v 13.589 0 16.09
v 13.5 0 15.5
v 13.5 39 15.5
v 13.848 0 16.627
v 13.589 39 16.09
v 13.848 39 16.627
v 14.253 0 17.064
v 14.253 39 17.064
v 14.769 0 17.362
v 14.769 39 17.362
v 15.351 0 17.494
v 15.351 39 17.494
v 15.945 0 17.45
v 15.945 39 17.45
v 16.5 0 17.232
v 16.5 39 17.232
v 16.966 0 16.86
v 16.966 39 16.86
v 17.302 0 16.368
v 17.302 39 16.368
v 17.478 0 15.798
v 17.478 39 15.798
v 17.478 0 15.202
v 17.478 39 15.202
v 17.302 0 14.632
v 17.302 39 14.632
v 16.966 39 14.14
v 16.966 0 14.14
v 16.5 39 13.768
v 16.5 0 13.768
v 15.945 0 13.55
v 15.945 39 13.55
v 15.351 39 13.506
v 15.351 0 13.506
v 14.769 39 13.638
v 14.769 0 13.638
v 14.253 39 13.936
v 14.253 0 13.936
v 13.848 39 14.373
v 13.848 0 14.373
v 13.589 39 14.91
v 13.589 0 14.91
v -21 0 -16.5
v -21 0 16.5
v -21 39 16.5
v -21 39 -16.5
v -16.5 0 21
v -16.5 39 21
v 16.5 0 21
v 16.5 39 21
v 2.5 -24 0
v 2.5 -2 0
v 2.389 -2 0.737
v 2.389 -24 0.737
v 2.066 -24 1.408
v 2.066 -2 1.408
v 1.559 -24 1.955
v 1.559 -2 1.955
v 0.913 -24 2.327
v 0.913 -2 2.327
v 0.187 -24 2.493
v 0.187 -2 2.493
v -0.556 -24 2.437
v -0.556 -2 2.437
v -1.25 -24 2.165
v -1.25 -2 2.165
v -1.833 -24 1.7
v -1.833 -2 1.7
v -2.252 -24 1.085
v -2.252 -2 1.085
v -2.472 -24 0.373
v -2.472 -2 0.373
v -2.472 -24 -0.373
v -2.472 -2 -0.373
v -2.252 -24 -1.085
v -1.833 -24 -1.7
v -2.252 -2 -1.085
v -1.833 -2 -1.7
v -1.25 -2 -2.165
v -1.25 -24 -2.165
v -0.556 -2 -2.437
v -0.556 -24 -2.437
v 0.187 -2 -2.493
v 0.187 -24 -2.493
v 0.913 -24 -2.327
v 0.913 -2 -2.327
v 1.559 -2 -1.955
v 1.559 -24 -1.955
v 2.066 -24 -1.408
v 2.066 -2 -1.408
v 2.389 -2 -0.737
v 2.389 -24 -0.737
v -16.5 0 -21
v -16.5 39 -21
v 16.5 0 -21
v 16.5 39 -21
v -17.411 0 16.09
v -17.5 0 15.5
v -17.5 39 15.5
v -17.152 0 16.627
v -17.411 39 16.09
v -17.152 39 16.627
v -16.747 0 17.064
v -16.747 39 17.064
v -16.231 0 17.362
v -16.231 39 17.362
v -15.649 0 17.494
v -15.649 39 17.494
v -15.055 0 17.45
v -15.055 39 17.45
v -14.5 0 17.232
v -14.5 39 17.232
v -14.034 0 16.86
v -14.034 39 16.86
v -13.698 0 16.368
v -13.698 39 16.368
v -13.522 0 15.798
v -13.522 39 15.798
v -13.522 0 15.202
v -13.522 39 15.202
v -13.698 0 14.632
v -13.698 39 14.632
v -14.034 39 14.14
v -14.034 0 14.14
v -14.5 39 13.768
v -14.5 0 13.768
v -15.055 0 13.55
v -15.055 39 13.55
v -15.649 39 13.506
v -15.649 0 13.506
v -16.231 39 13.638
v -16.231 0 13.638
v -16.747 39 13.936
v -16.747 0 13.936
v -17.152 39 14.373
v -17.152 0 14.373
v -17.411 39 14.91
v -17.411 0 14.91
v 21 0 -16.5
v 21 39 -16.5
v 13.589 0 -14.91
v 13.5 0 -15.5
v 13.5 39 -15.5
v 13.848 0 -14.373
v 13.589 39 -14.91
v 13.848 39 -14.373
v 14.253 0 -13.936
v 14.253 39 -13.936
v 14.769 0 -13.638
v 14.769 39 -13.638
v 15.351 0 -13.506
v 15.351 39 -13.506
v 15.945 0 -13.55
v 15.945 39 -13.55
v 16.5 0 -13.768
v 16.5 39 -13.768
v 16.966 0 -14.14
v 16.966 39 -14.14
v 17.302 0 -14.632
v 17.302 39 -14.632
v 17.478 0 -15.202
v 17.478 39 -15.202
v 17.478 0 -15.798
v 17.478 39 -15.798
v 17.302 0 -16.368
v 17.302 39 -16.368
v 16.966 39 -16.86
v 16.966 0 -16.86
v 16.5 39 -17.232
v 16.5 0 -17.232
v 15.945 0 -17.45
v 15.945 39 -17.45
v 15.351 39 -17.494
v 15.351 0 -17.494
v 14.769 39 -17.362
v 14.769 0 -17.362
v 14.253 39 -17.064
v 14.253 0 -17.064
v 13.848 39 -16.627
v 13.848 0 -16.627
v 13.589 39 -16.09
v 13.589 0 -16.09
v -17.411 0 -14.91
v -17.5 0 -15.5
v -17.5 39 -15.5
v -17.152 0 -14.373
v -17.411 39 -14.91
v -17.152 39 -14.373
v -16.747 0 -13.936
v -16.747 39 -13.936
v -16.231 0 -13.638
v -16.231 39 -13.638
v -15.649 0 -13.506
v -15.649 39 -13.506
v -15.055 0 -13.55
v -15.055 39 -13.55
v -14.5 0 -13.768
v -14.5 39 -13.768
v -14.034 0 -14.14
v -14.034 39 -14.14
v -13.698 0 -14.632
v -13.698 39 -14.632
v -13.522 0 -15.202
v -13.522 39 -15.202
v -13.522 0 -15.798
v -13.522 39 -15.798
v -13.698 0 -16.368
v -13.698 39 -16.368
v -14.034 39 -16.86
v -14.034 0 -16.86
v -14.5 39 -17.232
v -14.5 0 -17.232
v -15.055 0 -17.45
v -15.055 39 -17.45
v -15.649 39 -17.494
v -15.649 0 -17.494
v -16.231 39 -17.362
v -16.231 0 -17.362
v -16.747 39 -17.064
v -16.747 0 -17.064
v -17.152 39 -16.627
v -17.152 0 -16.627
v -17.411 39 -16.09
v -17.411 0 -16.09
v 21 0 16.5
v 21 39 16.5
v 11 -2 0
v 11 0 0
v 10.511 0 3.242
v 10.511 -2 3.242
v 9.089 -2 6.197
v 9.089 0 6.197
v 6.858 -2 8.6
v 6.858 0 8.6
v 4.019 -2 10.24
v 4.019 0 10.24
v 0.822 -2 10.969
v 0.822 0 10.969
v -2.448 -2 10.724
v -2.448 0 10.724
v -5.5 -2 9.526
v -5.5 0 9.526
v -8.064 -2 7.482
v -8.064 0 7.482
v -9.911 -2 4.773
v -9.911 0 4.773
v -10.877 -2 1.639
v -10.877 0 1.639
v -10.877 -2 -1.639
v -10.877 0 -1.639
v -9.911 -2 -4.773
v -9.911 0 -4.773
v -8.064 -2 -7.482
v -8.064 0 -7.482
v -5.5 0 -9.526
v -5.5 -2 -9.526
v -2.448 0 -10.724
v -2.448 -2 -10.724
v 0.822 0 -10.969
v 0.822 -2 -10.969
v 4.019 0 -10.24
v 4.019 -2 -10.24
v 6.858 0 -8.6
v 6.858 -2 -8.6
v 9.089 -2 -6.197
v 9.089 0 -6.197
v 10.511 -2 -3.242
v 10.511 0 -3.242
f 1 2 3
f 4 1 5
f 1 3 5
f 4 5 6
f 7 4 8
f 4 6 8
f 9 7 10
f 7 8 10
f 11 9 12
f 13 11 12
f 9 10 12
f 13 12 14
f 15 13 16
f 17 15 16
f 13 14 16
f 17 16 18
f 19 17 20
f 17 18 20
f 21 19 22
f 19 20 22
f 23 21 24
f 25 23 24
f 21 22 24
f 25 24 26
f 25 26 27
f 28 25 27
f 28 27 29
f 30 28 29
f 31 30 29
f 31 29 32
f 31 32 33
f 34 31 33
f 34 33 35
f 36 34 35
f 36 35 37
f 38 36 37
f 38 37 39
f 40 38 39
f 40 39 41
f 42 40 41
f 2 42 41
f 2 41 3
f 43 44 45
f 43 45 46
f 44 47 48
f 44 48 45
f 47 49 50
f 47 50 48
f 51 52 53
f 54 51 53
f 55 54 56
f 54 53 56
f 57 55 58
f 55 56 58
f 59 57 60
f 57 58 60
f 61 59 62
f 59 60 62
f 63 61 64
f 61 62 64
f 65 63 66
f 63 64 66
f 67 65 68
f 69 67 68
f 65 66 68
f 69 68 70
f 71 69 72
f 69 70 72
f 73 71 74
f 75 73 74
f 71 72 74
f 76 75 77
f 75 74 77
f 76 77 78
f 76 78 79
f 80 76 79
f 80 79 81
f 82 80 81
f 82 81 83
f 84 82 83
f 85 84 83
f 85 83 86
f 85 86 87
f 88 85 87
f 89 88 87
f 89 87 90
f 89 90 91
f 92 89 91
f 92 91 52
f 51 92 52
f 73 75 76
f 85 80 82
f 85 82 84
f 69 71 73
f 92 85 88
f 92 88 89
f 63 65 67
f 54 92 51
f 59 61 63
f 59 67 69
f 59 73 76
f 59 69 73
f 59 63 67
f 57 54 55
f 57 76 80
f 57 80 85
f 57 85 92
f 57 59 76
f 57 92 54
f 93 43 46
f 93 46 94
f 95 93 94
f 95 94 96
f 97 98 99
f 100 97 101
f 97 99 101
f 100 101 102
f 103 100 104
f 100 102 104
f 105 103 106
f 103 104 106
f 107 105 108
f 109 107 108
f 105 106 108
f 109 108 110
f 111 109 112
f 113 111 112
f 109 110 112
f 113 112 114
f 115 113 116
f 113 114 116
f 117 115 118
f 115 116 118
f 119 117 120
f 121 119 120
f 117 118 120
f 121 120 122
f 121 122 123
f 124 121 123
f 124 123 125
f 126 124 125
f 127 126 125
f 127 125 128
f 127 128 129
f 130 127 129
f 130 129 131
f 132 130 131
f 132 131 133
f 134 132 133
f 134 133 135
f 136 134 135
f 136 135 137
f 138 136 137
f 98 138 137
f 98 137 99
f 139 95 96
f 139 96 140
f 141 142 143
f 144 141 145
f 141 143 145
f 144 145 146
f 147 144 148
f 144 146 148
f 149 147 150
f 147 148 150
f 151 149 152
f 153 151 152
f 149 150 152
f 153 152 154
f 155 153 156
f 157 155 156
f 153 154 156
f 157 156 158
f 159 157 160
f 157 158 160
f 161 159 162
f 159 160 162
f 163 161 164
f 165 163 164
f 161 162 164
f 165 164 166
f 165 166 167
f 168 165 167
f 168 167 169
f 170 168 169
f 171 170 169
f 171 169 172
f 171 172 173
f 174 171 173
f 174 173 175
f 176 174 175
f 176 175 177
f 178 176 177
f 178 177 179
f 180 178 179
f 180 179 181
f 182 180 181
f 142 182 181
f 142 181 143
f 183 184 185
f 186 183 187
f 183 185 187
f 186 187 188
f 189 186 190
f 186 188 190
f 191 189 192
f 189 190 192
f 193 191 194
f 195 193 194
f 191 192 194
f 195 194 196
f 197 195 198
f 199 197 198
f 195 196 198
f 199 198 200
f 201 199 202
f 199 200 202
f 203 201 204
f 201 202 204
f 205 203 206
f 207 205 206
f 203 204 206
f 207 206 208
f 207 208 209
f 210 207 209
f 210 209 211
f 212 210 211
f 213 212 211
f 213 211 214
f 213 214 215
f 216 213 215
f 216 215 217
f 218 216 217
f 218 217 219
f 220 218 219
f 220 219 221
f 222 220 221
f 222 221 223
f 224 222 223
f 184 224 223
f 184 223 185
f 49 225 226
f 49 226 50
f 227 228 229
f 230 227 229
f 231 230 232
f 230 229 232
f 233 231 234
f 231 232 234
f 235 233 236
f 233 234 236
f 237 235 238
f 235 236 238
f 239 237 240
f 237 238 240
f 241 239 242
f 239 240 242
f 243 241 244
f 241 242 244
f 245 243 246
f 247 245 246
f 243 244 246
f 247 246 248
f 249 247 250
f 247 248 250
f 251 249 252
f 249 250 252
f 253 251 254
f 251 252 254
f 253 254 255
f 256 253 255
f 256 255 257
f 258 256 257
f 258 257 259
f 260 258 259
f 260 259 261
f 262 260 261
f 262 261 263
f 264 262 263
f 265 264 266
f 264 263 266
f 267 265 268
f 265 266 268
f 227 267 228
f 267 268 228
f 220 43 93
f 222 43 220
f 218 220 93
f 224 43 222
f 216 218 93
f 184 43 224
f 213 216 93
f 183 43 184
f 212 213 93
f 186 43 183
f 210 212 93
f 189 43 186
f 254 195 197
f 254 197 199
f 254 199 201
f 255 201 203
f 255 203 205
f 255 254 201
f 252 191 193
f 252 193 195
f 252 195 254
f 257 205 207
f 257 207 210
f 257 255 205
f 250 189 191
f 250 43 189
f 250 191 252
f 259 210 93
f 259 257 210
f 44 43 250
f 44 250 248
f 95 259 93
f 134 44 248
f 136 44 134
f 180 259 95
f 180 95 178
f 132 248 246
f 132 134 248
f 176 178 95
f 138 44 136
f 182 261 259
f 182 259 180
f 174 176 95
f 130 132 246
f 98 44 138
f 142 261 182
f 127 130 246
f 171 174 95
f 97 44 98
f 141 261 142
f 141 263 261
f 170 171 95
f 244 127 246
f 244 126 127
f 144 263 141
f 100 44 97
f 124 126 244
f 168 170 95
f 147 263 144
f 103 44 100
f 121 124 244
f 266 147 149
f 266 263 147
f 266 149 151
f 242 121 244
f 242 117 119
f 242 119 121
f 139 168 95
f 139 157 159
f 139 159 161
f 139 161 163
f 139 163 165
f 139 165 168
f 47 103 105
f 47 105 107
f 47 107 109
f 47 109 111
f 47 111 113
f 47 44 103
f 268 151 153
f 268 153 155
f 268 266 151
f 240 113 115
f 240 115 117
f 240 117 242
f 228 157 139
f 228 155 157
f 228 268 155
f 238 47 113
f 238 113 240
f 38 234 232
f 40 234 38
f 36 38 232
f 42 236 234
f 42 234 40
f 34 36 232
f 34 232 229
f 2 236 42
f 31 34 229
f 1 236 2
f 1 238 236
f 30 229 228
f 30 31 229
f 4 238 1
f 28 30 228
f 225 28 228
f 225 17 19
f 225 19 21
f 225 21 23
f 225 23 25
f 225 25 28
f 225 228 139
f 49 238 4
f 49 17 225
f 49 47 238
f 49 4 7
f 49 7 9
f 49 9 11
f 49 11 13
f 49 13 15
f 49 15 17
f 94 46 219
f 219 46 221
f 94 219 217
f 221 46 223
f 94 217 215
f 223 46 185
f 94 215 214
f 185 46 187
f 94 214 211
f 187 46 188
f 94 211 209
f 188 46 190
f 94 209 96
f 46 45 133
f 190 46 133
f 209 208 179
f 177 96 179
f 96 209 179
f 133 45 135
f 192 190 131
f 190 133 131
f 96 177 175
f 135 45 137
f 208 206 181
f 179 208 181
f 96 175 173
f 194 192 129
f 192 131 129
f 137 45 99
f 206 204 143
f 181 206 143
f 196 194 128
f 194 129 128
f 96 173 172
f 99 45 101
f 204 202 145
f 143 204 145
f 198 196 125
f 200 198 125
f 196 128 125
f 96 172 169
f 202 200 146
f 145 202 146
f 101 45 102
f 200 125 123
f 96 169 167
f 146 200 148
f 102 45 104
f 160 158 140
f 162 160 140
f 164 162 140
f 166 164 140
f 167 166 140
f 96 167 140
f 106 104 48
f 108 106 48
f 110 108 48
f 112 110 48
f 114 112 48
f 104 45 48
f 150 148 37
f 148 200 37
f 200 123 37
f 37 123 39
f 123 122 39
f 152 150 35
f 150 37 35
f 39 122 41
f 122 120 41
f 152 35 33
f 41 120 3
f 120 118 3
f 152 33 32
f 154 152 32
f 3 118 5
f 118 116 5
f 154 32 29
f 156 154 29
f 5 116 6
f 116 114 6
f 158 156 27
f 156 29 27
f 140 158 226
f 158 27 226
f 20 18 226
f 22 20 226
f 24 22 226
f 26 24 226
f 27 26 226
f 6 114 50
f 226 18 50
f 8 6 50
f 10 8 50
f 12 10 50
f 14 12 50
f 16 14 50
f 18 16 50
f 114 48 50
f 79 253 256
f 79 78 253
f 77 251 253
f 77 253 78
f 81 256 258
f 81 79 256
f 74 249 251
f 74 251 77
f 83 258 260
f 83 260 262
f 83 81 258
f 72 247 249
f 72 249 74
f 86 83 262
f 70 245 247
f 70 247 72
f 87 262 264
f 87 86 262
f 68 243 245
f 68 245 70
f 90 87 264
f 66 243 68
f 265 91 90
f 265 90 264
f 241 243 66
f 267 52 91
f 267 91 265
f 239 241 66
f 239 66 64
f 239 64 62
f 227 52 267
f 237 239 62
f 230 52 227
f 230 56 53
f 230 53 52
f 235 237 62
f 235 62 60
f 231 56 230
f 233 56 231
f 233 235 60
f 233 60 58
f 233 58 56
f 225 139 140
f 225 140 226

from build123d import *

# Parameters (mm, degrees)
F0_R     = 2.5
F3_DEPTH = 24
F1_R     = 11
F4_DEPTH = 2
F5_DEPTH = 39
F7_D     = 4


with BuildPart() as f3:
    # F0 (on Front) → F3 (new body)
    with BuildSketch(Plane.XZ):
        Circle(F0_R)
    extrude(amount=F3_DEPTH)

    # F1 (on Front) → F4 (join)
    with BuildSketch(Plane.XZ):
        Circle(F1_R)
    extrude(amount=F4_DEPTH)

    # F2 (on Front) → F5 (join)
    with BuildSketch(Plane.XZ):
        Polygon((21, 16.5), (16.5, 21), (-16.5, 21), (-21, 16.5), (-21, -16.5), (-16.5, -21), (16.5, -21), (21, -16.5), align=None)
    extrude(amount=-F5_DEPTH)

    # F7 (through all)
    with Locations(Plane.XZ):
        with Locations((-15.5, 15.5), (15.5, 15.5), (15.5, -15.5), (-15.5, -15.5)):
            Hole(F7_D / 2)


solid = f3.part
